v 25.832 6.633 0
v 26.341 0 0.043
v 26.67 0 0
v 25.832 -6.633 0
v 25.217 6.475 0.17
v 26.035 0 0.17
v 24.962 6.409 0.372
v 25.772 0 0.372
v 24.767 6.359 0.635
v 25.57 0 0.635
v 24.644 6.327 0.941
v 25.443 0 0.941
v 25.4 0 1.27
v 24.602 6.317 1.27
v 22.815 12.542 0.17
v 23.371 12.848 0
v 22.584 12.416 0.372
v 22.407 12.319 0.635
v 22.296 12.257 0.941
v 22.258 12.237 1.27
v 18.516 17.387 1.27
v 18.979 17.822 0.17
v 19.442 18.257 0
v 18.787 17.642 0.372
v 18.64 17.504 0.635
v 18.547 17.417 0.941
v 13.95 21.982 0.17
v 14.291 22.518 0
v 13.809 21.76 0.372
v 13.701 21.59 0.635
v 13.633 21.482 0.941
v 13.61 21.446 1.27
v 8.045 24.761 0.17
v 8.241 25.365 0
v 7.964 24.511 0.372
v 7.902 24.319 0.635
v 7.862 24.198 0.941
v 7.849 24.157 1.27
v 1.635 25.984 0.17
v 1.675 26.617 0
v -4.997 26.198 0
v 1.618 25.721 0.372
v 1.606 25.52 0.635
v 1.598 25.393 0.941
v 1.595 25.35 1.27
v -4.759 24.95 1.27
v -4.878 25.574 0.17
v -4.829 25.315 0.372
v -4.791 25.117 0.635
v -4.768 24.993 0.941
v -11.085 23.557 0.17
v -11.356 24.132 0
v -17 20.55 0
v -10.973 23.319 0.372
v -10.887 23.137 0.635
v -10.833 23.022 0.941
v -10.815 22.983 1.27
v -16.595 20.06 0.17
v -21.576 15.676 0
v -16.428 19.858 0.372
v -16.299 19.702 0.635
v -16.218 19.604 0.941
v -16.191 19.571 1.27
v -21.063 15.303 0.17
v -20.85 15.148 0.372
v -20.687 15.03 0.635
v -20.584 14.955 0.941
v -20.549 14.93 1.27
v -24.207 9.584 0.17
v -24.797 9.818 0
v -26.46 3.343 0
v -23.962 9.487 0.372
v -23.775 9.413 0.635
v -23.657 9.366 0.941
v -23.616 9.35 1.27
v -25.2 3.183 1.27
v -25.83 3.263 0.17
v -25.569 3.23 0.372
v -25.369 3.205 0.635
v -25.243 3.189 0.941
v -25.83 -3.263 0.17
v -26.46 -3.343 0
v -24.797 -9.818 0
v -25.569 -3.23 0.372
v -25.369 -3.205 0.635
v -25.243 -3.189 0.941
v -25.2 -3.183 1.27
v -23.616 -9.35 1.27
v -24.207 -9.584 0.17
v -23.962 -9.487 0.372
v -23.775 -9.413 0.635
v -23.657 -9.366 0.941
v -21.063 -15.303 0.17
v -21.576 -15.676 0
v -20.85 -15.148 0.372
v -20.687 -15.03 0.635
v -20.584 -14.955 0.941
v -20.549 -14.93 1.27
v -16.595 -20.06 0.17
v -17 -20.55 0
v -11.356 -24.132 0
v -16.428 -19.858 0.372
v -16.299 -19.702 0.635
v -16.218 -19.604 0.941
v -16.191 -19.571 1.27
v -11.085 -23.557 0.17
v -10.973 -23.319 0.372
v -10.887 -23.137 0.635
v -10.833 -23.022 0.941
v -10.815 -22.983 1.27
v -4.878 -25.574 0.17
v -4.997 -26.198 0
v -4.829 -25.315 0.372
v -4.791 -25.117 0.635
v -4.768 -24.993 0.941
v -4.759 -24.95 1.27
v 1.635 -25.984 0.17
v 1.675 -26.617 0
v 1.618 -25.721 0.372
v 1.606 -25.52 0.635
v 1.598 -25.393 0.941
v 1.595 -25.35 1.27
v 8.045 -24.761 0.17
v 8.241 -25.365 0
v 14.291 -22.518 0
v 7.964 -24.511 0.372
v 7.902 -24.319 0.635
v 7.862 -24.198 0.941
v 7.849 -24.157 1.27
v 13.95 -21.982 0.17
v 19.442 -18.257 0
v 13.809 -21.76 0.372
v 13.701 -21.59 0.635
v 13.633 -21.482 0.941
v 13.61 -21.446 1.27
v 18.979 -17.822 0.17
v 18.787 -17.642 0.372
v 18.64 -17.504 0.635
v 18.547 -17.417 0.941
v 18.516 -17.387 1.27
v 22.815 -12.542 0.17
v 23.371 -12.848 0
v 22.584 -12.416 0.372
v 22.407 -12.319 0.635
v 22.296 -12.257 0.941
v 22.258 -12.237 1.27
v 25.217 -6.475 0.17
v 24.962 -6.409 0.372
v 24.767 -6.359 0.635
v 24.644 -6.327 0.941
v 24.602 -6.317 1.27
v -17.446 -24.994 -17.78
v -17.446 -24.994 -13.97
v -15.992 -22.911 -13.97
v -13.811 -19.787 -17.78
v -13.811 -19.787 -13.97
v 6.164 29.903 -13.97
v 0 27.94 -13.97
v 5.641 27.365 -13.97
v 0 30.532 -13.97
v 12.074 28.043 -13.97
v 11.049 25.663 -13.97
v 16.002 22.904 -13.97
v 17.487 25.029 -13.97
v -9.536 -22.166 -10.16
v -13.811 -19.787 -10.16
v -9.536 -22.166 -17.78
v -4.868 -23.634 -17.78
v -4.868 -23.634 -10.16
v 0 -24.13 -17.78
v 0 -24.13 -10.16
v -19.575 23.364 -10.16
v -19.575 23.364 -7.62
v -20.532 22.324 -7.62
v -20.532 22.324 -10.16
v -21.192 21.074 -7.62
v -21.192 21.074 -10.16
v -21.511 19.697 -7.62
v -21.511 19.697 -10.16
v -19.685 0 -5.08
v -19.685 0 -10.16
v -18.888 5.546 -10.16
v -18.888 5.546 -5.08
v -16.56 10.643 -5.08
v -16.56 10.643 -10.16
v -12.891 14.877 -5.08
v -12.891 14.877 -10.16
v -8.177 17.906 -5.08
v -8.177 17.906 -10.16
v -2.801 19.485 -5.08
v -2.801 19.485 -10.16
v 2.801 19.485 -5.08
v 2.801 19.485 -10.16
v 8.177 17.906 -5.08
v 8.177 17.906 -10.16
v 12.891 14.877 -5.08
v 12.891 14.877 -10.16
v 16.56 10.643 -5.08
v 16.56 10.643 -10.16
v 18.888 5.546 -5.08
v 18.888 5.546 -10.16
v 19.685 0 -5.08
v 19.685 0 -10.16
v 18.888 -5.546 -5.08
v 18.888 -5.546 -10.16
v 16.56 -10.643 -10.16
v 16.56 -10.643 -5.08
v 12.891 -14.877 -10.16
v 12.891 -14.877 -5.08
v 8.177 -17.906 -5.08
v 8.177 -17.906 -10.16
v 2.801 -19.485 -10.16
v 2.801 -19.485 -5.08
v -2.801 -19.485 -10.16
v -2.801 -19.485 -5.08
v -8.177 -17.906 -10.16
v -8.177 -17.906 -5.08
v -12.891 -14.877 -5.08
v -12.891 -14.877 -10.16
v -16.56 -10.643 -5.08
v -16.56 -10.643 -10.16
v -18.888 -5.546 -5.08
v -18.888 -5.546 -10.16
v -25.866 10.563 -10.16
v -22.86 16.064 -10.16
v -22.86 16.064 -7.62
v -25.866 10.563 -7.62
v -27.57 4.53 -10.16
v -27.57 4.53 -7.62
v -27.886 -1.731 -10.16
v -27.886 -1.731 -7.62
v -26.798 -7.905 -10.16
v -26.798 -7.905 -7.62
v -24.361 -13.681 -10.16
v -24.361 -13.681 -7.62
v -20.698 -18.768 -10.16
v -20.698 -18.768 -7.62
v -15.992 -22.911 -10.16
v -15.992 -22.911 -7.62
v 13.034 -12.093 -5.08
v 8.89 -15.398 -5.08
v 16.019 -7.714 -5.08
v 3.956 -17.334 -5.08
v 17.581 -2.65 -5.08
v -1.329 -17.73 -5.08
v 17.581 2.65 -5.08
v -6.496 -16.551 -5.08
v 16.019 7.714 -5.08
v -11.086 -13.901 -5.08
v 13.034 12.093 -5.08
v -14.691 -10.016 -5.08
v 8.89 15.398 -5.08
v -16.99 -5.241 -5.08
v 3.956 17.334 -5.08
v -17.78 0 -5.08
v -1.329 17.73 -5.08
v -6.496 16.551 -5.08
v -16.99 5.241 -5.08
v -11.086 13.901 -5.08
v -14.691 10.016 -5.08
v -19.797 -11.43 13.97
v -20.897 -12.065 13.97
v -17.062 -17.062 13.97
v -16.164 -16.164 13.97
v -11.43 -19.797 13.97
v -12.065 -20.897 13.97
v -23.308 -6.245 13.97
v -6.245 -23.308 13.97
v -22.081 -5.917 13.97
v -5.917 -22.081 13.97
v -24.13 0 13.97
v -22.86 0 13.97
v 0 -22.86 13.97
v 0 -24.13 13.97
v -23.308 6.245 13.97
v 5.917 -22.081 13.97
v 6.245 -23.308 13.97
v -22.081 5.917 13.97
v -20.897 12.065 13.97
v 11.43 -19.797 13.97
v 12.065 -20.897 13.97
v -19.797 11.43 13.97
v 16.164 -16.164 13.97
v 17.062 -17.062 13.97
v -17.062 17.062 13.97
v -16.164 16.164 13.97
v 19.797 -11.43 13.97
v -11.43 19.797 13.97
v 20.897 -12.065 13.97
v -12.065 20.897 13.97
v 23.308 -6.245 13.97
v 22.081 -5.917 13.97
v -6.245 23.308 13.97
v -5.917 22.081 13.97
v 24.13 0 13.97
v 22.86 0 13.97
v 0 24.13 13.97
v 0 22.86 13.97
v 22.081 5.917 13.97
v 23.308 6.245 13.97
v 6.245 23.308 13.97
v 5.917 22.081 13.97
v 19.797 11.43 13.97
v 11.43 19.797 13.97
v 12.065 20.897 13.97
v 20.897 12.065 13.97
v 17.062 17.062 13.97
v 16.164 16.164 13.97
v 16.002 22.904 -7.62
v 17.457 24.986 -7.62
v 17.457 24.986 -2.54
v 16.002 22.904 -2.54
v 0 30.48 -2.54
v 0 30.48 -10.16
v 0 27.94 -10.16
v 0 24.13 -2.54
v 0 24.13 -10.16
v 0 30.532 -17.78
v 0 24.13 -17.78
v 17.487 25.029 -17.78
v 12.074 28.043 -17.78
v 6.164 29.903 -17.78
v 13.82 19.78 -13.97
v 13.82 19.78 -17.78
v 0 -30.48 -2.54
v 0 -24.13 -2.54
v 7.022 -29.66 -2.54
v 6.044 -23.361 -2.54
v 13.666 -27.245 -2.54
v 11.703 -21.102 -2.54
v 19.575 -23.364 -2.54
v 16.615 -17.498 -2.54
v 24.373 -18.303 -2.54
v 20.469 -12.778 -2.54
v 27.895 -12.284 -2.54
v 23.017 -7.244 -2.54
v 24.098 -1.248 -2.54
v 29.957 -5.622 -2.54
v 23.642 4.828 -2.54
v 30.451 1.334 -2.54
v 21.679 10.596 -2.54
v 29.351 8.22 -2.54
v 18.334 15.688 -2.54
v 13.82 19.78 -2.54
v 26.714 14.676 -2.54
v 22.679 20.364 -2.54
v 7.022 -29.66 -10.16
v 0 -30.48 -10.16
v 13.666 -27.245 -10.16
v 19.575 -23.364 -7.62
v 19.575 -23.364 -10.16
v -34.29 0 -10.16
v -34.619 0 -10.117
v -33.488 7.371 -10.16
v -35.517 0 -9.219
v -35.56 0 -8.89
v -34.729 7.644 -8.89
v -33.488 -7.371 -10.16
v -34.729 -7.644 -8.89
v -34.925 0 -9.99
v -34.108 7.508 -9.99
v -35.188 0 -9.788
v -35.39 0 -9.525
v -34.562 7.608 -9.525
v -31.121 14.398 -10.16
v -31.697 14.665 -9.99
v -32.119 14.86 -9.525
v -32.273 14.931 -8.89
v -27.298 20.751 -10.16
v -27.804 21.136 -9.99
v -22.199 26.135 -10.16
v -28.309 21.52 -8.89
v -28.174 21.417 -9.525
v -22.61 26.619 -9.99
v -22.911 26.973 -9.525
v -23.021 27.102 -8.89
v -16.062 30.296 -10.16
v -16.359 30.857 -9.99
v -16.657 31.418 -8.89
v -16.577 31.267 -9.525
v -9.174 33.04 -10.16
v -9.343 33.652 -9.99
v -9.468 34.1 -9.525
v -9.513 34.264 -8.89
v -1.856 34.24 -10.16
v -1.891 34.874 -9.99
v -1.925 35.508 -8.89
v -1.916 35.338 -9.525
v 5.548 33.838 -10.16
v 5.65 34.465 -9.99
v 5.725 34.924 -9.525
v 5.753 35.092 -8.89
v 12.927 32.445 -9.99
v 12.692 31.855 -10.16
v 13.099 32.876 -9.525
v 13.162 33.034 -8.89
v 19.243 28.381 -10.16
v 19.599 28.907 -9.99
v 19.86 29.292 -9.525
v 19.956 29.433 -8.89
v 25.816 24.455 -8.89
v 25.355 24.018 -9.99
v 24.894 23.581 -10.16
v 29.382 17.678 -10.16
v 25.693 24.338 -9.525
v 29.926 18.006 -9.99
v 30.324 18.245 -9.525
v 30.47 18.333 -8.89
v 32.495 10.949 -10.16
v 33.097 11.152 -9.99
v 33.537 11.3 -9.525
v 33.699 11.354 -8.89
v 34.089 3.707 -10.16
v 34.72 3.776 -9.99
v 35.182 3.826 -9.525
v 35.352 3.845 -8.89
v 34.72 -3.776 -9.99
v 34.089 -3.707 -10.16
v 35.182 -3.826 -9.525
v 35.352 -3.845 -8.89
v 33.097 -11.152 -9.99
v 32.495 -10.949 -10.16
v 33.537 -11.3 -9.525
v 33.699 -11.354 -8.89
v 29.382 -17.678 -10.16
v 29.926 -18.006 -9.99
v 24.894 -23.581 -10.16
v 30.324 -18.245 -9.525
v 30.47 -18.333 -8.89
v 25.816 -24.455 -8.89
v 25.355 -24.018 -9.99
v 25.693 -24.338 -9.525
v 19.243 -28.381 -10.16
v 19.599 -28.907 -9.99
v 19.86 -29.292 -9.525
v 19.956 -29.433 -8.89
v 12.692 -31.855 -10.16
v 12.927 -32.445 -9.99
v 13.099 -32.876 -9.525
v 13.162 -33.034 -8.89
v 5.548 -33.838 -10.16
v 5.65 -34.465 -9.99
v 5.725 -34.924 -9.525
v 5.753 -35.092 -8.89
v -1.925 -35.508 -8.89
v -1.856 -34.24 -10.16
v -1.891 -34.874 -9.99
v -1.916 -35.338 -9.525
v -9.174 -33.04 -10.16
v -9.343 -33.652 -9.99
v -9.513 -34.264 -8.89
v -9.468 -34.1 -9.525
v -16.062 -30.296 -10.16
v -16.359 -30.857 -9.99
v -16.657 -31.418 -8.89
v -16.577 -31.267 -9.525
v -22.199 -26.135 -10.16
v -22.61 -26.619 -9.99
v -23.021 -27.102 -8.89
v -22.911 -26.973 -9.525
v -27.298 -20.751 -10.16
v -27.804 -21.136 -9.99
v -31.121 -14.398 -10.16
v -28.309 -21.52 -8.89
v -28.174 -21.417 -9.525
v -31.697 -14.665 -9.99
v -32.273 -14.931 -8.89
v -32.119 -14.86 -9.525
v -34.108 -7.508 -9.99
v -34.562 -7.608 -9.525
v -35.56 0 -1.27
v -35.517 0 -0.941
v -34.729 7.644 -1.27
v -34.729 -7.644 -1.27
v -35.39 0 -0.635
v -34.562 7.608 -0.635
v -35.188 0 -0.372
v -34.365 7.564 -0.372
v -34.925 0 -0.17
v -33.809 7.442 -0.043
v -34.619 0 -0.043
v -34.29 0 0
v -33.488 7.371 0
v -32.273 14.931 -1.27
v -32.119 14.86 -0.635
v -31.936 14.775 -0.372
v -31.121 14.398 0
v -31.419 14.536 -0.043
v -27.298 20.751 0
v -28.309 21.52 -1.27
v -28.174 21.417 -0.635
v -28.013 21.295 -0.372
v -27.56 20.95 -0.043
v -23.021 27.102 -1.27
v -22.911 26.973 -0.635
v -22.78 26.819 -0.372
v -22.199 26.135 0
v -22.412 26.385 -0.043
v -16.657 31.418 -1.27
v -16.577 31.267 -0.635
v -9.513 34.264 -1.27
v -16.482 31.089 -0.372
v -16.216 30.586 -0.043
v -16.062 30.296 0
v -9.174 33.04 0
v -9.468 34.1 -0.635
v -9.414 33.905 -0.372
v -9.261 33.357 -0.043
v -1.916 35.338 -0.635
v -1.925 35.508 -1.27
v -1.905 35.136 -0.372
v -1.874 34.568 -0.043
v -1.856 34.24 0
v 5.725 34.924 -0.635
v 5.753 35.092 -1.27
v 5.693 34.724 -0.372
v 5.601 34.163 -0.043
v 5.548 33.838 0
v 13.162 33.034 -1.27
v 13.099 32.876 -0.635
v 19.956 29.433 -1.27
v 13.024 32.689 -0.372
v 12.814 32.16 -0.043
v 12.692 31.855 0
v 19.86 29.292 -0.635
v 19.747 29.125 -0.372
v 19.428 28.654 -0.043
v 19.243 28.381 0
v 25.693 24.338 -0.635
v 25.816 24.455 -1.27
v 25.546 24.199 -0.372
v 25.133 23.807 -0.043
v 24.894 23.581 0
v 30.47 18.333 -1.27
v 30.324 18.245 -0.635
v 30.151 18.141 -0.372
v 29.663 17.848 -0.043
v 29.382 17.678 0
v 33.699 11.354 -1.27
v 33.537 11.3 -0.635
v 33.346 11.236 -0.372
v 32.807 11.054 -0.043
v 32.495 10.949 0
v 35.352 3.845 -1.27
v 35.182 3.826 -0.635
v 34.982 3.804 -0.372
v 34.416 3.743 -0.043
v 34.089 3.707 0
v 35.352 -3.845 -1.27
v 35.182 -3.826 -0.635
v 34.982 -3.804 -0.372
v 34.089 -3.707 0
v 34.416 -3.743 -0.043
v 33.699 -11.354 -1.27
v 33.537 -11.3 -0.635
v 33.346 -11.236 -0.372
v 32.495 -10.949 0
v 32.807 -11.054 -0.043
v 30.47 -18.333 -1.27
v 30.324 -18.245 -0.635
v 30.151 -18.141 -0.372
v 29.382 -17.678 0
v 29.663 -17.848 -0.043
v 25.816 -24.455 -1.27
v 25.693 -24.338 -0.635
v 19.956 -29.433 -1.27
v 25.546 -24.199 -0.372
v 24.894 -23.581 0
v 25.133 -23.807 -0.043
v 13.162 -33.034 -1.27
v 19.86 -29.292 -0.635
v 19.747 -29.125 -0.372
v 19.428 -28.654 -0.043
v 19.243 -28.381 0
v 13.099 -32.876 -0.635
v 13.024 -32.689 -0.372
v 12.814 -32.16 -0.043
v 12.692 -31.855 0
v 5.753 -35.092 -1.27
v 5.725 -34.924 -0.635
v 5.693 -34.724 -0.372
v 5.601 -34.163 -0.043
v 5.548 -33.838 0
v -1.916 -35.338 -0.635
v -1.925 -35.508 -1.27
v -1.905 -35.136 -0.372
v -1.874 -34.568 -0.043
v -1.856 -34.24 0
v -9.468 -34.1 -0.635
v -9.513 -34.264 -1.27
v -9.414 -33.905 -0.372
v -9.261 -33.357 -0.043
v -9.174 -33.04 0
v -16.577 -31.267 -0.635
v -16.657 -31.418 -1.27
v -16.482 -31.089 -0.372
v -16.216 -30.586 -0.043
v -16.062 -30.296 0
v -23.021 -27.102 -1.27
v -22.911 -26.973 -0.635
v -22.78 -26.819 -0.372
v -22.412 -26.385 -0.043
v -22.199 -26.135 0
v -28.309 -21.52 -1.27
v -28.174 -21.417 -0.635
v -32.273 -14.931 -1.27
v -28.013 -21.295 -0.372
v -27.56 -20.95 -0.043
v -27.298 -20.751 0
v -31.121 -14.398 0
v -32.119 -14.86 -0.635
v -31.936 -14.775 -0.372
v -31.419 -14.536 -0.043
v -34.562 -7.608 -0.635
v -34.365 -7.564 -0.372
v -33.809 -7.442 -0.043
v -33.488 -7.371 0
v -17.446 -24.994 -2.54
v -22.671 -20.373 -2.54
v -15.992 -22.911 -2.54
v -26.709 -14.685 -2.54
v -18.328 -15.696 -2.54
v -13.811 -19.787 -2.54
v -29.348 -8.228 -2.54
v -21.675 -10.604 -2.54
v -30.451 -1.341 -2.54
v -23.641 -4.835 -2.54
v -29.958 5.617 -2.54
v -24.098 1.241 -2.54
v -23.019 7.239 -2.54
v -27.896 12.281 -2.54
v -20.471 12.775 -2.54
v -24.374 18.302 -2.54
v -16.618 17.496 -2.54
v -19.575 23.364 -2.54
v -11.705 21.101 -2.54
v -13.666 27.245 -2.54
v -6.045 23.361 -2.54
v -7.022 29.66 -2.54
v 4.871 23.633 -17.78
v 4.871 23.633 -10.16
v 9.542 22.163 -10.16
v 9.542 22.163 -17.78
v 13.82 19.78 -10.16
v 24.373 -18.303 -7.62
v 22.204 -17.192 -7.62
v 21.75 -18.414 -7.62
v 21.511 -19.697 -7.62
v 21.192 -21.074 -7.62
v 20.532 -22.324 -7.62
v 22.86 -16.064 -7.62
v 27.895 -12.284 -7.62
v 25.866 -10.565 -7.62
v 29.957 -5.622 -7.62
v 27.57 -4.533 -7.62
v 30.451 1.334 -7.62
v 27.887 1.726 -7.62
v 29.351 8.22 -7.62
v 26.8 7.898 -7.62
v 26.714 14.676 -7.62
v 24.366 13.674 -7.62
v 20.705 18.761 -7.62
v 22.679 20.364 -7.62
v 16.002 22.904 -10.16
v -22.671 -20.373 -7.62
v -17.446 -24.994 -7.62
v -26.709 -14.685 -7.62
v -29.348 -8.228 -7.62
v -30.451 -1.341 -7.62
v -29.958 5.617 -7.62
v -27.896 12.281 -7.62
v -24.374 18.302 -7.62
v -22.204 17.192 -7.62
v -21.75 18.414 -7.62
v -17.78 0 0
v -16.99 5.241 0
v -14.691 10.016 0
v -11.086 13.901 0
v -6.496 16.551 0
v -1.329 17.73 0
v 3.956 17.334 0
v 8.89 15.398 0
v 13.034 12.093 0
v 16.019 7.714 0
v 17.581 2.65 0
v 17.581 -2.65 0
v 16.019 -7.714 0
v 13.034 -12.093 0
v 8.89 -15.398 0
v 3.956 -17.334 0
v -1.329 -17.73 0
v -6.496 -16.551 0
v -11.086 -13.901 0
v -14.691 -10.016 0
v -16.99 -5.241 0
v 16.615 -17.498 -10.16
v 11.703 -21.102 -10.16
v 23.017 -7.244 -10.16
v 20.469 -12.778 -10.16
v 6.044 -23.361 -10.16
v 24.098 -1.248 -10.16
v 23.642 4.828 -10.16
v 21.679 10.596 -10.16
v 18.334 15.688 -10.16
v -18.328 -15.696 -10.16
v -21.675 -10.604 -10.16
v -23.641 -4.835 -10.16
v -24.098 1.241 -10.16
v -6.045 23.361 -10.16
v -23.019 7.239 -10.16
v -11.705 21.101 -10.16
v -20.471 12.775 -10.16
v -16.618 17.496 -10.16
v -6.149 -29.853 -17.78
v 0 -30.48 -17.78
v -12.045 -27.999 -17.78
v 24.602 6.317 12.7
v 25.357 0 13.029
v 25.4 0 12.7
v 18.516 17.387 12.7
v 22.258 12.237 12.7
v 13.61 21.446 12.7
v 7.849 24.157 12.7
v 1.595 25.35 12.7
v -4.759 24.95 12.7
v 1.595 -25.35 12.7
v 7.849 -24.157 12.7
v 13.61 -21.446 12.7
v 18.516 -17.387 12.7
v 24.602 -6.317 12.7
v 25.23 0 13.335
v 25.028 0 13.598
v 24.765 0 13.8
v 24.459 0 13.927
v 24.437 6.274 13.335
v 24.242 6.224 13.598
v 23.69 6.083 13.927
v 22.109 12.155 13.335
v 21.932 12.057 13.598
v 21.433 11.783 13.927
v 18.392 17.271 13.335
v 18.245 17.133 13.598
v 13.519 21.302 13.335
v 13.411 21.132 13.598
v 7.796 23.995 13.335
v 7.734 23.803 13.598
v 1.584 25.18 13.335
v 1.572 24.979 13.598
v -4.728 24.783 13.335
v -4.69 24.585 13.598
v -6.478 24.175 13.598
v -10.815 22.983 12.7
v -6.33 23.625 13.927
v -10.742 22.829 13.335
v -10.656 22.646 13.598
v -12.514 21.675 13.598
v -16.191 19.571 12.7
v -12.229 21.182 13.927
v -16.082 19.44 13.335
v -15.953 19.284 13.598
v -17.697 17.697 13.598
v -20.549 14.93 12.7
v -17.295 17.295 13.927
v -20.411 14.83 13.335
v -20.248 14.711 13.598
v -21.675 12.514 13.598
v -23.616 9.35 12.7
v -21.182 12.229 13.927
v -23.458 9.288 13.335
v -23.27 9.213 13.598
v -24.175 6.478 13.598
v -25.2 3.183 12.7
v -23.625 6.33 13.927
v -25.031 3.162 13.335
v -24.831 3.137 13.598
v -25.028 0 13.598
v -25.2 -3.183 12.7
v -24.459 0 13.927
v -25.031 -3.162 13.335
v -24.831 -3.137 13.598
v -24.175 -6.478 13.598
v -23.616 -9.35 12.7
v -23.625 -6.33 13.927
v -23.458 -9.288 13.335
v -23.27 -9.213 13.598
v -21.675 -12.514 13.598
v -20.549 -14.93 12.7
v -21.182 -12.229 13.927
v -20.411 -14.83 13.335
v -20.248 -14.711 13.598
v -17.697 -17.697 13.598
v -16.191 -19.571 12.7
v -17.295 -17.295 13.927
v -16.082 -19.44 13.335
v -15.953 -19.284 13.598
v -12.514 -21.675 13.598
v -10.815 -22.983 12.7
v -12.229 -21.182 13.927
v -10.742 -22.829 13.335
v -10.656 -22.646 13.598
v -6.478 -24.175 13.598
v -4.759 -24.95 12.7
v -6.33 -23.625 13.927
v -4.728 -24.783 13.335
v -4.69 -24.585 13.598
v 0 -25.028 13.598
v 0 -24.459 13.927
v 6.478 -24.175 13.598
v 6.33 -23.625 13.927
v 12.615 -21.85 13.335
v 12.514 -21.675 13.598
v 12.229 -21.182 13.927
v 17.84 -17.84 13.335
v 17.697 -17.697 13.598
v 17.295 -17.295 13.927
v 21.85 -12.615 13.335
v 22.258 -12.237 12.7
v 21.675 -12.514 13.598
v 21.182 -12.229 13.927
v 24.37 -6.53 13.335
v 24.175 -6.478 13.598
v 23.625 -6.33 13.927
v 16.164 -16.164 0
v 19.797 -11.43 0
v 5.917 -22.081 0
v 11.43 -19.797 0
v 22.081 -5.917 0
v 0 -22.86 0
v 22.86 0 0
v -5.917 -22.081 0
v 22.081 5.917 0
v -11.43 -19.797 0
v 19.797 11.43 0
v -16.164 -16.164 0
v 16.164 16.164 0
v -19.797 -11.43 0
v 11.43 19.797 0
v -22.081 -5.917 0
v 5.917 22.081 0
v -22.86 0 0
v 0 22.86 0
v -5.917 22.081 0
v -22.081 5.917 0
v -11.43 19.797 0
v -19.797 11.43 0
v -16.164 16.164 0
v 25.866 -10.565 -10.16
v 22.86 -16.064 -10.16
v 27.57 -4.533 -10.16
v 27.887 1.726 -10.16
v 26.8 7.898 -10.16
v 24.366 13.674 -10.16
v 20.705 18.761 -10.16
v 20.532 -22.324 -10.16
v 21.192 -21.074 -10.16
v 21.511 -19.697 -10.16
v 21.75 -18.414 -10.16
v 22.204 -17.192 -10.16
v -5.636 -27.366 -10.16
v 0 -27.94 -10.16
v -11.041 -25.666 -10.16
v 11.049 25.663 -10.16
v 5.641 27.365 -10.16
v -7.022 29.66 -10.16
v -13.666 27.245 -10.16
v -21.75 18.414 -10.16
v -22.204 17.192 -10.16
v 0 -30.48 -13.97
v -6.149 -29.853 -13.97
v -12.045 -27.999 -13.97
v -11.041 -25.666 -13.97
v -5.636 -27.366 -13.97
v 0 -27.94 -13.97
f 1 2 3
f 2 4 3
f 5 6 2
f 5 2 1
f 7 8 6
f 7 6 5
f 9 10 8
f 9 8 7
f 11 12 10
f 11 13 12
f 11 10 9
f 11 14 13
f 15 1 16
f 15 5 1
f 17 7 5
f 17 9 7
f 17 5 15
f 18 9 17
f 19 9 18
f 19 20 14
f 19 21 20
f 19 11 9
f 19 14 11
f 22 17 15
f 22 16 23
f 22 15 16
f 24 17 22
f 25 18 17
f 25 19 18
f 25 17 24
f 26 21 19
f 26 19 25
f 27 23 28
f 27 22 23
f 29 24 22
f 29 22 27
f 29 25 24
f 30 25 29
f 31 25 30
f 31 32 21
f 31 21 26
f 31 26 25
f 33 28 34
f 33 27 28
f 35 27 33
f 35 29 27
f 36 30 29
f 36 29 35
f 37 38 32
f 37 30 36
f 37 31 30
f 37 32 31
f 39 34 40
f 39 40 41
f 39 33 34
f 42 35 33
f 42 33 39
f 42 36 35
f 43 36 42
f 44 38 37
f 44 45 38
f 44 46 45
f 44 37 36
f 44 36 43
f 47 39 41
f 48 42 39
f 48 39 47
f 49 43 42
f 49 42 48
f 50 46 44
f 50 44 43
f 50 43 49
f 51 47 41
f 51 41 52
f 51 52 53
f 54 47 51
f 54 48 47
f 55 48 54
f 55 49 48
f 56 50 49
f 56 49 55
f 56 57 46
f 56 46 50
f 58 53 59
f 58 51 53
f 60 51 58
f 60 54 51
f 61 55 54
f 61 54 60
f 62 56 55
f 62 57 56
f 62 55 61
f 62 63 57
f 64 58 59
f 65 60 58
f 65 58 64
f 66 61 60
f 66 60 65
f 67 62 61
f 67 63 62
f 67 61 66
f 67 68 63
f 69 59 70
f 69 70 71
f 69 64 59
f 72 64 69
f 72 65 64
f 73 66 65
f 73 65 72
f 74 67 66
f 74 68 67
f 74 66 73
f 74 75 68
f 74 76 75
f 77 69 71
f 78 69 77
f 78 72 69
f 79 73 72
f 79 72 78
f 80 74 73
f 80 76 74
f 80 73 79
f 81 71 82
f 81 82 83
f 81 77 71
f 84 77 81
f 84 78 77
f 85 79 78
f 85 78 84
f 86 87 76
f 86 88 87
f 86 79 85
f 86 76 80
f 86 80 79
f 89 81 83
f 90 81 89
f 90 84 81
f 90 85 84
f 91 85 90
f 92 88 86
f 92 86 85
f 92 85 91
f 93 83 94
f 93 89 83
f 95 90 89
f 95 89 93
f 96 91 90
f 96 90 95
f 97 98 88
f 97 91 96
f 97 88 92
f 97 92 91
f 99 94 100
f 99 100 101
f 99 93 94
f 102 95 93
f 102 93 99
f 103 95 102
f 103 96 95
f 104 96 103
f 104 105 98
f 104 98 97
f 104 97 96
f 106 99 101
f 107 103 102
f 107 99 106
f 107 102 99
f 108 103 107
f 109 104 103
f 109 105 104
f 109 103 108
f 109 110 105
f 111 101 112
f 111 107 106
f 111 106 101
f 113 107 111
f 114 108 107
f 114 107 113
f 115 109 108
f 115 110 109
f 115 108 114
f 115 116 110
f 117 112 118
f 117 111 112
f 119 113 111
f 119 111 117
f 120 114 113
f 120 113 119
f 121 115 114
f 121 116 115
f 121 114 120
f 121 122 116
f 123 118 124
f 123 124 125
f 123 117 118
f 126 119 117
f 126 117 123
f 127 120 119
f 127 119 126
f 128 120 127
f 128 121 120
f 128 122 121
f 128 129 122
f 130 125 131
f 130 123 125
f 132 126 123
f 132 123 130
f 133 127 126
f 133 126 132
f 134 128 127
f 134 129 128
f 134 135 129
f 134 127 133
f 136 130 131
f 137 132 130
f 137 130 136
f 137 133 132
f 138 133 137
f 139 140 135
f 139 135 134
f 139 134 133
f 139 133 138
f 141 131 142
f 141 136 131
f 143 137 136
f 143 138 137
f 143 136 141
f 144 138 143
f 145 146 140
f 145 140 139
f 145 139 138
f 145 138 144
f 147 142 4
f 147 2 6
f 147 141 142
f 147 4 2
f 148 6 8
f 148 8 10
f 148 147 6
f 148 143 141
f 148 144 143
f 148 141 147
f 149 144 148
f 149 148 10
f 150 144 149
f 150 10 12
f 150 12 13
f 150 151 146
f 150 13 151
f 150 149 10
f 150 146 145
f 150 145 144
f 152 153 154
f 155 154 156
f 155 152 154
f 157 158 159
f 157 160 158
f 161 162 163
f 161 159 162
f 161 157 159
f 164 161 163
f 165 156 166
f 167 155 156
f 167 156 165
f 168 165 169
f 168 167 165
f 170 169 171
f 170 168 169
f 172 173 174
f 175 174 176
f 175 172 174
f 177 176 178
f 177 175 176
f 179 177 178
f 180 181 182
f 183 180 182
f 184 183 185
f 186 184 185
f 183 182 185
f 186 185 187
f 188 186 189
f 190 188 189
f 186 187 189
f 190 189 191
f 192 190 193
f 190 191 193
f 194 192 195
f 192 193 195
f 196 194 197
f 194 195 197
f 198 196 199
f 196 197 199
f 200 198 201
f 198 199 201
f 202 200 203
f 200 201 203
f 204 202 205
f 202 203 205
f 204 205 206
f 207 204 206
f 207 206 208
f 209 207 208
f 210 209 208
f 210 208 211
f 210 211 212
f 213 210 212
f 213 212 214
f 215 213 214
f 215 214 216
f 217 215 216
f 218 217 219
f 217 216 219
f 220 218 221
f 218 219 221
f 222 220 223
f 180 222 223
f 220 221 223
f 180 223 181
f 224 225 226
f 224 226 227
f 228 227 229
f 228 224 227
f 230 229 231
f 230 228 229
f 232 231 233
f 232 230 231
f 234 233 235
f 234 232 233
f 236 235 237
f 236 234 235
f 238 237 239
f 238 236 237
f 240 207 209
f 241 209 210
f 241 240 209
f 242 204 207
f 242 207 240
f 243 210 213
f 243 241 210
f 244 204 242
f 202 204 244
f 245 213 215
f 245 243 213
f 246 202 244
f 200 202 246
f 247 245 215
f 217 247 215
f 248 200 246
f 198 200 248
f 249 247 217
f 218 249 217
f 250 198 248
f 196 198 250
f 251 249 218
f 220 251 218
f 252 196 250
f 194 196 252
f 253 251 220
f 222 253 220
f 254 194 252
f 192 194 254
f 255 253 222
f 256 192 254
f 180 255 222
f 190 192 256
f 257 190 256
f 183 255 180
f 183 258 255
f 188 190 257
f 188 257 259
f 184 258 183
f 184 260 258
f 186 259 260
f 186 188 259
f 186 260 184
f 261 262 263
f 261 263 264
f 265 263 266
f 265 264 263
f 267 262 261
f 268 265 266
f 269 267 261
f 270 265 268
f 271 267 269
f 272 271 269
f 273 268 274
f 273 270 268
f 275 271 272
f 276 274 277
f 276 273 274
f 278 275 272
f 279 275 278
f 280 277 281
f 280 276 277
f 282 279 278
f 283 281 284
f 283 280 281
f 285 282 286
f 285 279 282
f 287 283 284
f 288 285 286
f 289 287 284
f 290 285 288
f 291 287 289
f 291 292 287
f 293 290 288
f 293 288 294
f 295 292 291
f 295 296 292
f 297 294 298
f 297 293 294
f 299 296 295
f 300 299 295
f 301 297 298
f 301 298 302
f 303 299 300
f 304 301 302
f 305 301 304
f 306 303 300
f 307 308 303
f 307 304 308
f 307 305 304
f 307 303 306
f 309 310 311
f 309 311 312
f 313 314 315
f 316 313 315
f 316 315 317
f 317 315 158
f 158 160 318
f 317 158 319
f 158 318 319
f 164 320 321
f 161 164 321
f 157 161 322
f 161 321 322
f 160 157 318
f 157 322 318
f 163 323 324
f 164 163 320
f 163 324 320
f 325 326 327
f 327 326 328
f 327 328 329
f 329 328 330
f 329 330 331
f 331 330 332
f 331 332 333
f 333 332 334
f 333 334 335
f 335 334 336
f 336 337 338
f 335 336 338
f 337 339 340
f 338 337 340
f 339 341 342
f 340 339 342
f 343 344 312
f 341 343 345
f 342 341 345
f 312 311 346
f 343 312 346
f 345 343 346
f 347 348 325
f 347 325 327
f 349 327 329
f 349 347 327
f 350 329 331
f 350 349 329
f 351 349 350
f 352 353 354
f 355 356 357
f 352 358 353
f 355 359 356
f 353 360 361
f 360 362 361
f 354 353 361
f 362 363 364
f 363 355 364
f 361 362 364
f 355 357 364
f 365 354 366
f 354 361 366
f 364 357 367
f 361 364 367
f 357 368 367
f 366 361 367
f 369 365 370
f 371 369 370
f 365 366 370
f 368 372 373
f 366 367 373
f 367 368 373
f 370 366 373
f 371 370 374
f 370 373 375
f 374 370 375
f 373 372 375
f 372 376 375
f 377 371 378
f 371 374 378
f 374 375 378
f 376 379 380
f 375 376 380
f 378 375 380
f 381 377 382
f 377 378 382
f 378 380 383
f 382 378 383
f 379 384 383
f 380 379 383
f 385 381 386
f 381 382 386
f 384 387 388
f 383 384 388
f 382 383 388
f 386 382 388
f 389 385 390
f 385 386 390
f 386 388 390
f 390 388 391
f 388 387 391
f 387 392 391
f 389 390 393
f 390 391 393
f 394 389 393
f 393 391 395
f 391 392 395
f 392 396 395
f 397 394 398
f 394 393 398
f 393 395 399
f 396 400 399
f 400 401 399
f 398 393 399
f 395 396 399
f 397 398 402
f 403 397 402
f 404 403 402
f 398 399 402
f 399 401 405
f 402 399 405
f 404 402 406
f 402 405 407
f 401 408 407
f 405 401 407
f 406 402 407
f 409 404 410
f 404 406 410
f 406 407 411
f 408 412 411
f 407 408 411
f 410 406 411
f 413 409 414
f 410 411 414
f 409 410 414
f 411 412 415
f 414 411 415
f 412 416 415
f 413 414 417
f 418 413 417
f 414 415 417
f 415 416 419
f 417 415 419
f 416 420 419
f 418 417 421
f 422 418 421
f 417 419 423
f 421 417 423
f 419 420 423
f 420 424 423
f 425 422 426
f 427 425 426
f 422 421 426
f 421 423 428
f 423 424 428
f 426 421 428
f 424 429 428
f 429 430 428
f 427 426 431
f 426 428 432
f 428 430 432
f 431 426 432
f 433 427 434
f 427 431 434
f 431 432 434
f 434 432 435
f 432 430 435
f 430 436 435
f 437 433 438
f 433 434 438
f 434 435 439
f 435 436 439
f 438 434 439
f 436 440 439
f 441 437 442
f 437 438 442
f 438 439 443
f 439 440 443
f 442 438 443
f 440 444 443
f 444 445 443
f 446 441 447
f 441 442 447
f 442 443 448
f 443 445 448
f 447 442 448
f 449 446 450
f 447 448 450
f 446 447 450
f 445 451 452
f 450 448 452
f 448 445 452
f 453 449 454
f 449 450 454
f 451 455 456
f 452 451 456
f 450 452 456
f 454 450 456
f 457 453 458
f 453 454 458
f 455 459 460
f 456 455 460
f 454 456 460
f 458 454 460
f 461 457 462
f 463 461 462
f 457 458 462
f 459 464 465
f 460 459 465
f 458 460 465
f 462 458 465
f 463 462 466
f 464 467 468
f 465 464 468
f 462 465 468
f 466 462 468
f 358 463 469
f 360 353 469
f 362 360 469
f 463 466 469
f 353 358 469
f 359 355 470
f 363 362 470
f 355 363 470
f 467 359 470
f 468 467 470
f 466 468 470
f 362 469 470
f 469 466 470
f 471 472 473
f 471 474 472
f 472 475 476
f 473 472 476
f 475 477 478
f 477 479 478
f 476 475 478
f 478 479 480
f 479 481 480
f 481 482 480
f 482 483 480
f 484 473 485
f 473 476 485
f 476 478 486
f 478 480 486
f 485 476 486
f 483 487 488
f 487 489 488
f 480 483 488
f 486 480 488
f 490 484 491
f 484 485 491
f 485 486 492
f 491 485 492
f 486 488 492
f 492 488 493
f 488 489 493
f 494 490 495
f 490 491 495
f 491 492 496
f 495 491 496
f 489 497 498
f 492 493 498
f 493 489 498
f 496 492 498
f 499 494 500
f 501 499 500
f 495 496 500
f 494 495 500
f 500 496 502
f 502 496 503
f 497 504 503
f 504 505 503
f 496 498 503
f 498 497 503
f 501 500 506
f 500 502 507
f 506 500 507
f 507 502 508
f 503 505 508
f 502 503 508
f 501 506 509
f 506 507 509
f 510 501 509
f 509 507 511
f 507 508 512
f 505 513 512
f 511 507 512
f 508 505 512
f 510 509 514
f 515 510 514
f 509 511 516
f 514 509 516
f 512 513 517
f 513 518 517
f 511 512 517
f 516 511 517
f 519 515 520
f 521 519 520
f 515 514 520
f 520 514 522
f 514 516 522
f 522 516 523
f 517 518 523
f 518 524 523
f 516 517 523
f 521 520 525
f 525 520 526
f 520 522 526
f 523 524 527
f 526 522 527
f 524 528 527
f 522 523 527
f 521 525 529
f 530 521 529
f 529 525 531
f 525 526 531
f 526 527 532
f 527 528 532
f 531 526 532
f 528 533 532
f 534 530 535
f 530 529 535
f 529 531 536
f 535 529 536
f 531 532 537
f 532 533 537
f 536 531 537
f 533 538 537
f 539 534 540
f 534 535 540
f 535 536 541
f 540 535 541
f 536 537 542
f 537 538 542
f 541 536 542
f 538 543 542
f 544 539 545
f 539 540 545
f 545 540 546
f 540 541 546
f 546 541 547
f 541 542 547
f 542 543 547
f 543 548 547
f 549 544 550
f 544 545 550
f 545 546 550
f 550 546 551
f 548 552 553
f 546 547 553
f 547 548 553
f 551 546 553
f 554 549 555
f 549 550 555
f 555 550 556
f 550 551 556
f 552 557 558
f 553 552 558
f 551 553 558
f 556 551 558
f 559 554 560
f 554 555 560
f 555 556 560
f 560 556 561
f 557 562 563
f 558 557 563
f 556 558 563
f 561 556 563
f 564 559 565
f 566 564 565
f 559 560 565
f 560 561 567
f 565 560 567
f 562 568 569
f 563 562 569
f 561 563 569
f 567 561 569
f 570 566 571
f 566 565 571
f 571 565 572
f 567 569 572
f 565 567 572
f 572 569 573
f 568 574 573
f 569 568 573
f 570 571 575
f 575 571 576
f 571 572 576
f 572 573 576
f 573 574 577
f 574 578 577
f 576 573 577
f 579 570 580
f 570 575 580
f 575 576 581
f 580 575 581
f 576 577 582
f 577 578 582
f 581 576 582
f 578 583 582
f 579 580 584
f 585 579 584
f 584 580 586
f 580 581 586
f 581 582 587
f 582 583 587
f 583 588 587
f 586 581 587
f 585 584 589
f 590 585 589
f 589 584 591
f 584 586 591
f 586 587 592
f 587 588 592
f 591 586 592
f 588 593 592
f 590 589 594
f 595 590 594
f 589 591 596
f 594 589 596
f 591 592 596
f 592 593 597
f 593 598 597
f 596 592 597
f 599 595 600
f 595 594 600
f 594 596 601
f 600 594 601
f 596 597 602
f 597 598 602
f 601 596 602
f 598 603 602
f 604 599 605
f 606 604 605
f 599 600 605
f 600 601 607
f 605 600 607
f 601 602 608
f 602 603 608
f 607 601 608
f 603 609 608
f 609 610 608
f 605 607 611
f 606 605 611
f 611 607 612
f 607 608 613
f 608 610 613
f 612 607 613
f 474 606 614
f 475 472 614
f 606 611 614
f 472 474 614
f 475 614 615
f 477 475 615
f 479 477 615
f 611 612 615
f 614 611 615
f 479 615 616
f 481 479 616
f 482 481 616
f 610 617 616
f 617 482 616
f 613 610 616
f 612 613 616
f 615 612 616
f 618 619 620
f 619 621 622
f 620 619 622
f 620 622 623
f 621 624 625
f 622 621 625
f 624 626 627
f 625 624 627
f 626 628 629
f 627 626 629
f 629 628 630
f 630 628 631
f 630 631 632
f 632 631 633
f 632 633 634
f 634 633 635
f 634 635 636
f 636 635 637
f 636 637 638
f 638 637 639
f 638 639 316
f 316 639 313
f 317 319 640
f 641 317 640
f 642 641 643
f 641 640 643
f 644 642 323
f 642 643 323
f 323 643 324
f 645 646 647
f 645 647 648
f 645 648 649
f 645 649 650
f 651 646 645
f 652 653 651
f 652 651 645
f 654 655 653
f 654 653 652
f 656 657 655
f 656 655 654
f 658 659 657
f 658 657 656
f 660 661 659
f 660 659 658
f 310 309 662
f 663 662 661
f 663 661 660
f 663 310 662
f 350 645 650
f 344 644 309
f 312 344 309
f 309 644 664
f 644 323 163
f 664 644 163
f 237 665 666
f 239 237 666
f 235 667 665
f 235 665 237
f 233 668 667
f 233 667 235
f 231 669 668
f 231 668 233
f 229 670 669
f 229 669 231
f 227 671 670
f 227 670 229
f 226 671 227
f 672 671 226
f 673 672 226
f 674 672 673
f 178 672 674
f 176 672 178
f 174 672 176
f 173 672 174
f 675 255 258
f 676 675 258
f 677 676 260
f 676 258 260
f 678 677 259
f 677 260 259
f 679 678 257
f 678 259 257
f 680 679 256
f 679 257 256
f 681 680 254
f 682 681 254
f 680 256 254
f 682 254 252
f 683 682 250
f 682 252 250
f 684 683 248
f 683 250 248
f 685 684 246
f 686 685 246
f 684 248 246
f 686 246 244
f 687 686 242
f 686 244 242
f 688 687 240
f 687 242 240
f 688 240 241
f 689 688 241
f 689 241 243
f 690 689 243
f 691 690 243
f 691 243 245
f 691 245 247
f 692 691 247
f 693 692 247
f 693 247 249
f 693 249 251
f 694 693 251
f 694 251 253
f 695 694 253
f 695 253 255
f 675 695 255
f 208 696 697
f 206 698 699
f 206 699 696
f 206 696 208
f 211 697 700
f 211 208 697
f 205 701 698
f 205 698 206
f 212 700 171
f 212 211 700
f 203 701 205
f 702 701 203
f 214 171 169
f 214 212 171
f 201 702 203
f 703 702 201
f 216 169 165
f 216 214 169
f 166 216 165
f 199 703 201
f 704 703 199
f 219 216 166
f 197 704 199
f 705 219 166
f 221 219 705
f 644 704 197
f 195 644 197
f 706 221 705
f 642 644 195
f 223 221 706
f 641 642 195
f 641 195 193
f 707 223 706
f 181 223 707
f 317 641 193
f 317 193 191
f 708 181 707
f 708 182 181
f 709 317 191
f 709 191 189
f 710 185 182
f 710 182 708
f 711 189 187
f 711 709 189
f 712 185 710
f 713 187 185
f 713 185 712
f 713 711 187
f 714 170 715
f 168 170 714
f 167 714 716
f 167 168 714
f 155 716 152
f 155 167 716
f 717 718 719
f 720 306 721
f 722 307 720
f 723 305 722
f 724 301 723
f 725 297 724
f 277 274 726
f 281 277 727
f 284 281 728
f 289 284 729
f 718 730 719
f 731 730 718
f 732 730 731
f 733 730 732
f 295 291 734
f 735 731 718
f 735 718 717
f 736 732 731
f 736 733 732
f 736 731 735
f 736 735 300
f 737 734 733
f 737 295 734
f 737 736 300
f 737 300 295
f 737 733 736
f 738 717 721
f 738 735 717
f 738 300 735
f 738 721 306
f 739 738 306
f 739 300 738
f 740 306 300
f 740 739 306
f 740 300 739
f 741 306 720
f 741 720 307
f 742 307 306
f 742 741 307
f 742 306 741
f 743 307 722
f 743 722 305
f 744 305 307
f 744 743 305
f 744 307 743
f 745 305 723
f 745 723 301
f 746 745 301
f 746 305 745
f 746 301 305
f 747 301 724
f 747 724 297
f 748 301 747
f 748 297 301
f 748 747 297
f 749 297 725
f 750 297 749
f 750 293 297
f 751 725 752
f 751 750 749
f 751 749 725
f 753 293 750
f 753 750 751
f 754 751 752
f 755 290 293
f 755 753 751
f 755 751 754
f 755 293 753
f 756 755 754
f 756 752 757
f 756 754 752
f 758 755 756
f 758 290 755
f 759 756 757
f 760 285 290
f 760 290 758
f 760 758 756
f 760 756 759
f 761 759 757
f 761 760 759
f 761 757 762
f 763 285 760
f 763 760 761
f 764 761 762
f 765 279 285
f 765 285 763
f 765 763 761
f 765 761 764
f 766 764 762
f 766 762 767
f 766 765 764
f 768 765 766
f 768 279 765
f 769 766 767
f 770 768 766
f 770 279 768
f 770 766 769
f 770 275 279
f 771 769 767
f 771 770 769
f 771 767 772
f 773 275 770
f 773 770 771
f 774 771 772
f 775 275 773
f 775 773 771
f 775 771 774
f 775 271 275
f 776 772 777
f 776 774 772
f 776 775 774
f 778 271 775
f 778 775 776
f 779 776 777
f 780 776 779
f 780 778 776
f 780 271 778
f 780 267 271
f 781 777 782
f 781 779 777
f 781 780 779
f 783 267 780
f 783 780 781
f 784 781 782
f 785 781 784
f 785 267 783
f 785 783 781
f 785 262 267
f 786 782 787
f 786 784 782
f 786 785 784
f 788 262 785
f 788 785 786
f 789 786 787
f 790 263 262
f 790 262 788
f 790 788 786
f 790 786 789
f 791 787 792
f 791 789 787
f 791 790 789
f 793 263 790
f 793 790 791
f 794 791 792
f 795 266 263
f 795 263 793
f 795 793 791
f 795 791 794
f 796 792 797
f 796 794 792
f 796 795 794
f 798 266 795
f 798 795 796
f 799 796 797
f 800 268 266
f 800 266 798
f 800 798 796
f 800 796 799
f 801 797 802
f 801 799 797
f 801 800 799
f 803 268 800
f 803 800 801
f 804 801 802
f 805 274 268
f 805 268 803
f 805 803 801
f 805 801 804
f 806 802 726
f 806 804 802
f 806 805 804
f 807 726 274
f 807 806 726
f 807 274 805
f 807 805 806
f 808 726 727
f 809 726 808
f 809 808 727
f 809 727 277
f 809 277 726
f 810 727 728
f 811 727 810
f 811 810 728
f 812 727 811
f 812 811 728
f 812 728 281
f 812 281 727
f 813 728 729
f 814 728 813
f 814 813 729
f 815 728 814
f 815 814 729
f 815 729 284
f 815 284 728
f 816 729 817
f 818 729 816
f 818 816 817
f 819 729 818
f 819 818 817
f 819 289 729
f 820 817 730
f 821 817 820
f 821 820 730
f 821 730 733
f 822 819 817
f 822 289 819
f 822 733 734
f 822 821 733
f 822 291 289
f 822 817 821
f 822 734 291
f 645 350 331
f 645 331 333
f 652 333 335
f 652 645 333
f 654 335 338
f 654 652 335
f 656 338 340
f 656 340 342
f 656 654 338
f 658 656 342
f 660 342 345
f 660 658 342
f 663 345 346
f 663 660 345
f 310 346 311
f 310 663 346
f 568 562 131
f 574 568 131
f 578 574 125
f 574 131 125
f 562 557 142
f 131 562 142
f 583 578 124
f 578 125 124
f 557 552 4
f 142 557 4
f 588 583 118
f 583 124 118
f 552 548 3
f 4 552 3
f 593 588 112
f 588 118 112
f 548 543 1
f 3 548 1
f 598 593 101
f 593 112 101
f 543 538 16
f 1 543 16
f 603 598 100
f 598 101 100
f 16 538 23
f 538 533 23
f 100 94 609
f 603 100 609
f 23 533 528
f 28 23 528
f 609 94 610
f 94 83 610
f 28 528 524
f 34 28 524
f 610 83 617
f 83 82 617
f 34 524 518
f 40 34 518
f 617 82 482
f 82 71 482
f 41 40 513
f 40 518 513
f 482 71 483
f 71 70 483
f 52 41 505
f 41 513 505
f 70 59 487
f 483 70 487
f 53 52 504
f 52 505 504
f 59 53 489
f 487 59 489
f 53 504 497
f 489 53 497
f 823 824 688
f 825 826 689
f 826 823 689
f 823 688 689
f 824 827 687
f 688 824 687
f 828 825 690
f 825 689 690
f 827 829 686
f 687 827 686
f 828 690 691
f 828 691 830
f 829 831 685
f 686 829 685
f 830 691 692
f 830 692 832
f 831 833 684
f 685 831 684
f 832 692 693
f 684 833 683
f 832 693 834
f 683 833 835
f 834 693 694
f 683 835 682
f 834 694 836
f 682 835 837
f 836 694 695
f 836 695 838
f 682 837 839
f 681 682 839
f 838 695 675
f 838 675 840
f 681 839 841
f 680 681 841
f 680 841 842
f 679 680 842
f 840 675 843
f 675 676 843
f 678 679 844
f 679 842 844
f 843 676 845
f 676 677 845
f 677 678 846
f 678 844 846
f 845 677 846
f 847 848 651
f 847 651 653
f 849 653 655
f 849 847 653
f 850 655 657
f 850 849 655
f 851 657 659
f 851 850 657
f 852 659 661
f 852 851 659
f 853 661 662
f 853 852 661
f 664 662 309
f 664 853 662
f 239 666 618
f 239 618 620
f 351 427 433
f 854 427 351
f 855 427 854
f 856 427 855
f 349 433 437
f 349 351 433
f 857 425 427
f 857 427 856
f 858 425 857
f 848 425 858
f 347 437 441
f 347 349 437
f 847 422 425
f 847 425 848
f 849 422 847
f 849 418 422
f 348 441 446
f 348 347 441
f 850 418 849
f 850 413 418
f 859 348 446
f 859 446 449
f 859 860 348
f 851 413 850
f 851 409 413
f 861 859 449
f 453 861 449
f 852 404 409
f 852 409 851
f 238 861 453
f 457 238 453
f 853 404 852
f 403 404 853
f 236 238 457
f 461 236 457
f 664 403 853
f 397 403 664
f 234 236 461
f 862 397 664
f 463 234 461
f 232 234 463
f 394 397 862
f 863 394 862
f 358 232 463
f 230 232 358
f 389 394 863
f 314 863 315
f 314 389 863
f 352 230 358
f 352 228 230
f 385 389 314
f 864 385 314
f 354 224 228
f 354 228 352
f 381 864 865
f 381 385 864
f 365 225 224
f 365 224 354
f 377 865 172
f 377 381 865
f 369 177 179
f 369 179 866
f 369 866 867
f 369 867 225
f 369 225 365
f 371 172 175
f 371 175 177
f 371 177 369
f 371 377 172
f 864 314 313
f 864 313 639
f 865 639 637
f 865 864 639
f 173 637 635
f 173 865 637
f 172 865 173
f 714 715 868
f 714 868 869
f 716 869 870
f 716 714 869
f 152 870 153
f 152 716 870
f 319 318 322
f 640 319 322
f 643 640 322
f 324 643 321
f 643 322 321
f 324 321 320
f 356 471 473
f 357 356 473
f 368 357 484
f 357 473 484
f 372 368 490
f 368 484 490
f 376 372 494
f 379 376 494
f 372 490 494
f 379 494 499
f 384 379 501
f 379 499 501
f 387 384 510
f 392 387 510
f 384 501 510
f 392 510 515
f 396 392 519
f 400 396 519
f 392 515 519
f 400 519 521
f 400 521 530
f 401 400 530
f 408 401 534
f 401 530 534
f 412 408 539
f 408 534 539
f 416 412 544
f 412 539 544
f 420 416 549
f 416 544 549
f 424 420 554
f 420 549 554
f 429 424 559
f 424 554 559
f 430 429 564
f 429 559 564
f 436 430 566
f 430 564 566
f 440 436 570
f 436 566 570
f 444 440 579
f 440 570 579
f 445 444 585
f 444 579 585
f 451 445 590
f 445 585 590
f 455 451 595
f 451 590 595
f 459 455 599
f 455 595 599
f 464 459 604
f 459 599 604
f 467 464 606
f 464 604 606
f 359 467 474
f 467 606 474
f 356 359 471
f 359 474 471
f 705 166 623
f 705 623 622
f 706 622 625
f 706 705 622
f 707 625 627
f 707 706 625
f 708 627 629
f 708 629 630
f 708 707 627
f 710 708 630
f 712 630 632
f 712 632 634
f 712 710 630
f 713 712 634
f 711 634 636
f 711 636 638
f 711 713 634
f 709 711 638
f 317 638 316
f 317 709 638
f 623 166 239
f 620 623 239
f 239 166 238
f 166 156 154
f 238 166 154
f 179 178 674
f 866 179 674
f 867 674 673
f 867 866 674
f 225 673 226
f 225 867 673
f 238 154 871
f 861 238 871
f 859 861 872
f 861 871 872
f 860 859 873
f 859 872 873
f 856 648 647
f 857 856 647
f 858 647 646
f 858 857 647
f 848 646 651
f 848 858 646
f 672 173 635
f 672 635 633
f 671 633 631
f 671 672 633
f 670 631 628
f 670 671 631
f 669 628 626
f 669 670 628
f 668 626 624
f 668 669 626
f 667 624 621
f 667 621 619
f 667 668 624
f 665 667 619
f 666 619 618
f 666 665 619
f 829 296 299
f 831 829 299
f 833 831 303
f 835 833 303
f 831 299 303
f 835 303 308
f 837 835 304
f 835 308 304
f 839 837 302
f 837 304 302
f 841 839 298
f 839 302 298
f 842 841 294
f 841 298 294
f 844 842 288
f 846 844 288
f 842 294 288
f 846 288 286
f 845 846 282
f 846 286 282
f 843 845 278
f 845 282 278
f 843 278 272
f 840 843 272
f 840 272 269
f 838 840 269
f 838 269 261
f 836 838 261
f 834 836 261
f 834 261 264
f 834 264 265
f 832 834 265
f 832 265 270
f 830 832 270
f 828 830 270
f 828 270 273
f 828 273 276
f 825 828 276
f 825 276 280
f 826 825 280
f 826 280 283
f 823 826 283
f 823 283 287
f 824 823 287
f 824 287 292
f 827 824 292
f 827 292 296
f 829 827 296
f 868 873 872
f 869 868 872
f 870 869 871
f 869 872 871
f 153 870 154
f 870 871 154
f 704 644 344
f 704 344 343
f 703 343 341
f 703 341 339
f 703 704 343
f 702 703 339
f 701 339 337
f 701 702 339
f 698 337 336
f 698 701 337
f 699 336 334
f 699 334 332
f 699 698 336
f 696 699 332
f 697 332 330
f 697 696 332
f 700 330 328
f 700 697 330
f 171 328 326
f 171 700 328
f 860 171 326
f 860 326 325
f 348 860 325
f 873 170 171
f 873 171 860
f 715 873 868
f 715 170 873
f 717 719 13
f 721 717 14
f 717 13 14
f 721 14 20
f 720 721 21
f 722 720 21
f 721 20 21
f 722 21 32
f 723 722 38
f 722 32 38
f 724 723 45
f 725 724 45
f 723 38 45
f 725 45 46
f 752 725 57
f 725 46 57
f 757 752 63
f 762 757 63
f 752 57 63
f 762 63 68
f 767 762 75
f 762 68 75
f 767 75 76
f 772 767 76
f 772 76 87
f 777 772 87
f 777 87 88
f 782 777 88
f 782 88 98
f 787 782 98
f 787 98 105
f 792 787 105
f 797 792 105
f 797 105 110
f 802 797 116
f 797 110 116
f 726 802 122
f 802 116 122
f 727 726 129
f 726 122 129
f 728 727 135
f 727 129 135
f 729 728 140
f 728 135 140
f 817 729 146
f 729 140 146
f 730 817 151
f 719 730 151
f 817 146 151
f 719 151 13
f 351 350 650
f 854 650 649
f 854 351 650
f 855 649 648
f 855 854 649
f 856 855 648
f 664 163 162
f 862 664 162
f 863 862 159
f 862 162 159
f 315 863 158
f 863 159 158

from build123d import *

# Parameters (mm, degrees)
SKETCH1_R           = 25.4
BOSS_EXTRUDE1_DEPTH = 13.97
SKETCH2_R           = 22.86
CUT_EXTRUDE1_DEPTH  = 25.4
SKETCH3_R           = 35.56
BOSS_EXTRUDE2_DEPTH = 10.16
SKETCH4_R           = 17.78
CUT_EXTRUDE2_DEPTH  = 10.16
CUT_EXTRUDE3_DEPTH  = 7.62
CUT_EXTRUDE4_DEPTH  = 5.08
BOSS_EXTRUDE3_START = 3.81
BOSS_EXTRUDE3_DEPTH = 3.81
BOSS_EXTRUDE4_START = 3.81
BOSS_EXTRUDE4_DEPTH = 3.81
FILLET1_R           = 1.27
FILLET2_R           = 1.27
BOSS_EXTRUDE5_START = 3.81
BOSS_EXTRUDE5_DEPTH = 3.81
BOSS_EXTRUDE6_START = 3.81
BOSS_EXTRUDE6_DEPTH = 3.81
SKETCH12_R          = 19.685
SKETCH12_R_2        = 15.494
CUT_EXTRUDE5_DEPTH  = 5.08
CUT_EXTRUDE6_DEPTH  = 7.62
CUT_EXTRUDE7_DEPTH  = 5.08


with BuildPart() as part:
    # Sketch1 → Boss-Extrude1 (new body)
    with BuildSketch(Plane.XY):
        Circle(SKETCH1_R)
    extrude(amount=BOSS_EXTRUDE1_DEPTH)

    # Sketch2 → Cut-Extrude1 (cut)
    with BuildSketch(Plane.XY.offset(13.97)):
        Circle(SKETCH2_R)
    extrude(amount=-CUT_EXTRUDE1_DEPTH, mode=Mode.SUBTRACT)

    # Sketch3 → Boss-Extrude2 (add)
    with BuildSketch(Plane(origin=(0, 0, 0), x_dir=(-1, 0, 0), z_dir=(0, 0, -1))):
        Circle(SKETCH3_R)
    extrude(amount=BOSS_EXTRUDE2_DEPTH)

    # Sketch4 → Cut-Extrude2 (cut)
    with BuildSketch(Plane(origin=(0, 0, -10.16), x_dir=(-1, 0, 0), z_dir=(0, 0, -1))):
        Circle(SKETCH4_R)
    extrude(amount=-CUT_EXTRUDE2_DEPTH, mode=Mode.SUBTRACT)

    # Sketch5 → Cut-Extrude3 (cut)
    with BuildSketch(Plane(origin=(0, 0, -10.16), x_dir=(-1, 0, 0), z_dir=(0, 0, -1))):
        with BuildLine():
            Line((0, 24.13), (0, 30.48))
            ThreePointArc((0, 30.48), (10.414, 28.645750191), (19.574595964, 23.363766667))
            ThreePointArc((19.574595964, 23.363766667), (20.902767484, 21.720232391), (21.5114344, 19.696678812))
            ThreePointArc((21.5114344, 19.696678812), (21.950994255, 17.793379172), (22.86, 16.064370514))
            ThreePointArc((22.86, 16.064370514), (27.516036857, -4.848846843), (15.991836773, -22.9108))
            Line((15.991836773, -22.9108), (13.811131758, -19.7866))
            ThreePointArc((13.811131758, -19.7866), (23.01855293, 7.239), (0, 24.13))
        make_face()
    extrude(amount=-CUT_EXTRUDE3_DEPTH, mode=Mode.SUBTRACT)

    # Sketch7 → Cut-Extrude4 (cut)
    with BuildSketch(Plane(origin=(0, 0, -7.62), x_dir=(-1, 0, 0), z_dir=(0, 0, -1))):
        with BuildLine():
            Line((17.445640116, -24.9936), (15.991836773, -22.9108))
            ThreePointArc((15.991836773, -22.9108), (27.516036857, -4.848846843), (22.86, 16.064370514))
            ThreePointArc((22.86, 16.064370514), (21.950994255, 17.793379172), (21.5114344, 19.696678812))
            ThreePointArc((21.5114344, 19.696678812), (20.902767484, 21.720232391), (19.574595964, 23.363766667))
            ThreePointArc((19.574595964, 23.363766667), (30.450504061, -1.340597786), (17.445640116, -24.9936))
        make_face()
    extrude(amount=-CUT_EXTRUDE4_DEPTH, mode=Mode.SUBTRACT)

    # Sketch8 → Boss-Extrude3 (add)
    with BuildSketch(Plane(origin=(0, 0, -10.16), x_dir=(-1, 0, 0), z_dir=(0, 0, -1)).offset(BOSS_EXTRUDE3_START)):
        with BuildLine():
            Line((0, -27.94), (0, -24.13))
            ThreePointArc((0, -24.13), (7.239, -23.01855293), (13.811131758, -19.7866))
            Line((13.811131758, -19.7866), (15.991836773, -22.9108))
            ThreePointArc((15.991836773, -22.9108), (8.382, -26.653061288), (0, -27.94))
        make_face()
    extrude(amount=-BOSS_EXTRUDE3_DEPTH)

    # Sketch9 → Boss-Extrude4 (add)
    with BuildSketch(Plane(origin=(0, 0, -13.97), x_dir=(-1, 0, 0), z_dir=(0, 0, -1)).offset(BOSS_EXTRUDE4_START)):
        with BuildLine():
            Line((0, -24.13), (0, -30.48))
            ThreePointArc((0, -30.48), (9.144, -29.076066859), (17.445640116, -24.9936))
            Line((17.445640116, -24.9936), (13.811131758, -19.7866))
            ThreePointArc((13.811131758, -19.7866), (7.239, -23.01855293), (0, -24.13))
        make_face()
    extrude(amount=-BOSS_EXTRUDE4_DEPTH)

    # Fillet1
    fillet1_edges = [part.edges().sort_by_distance(p)[0] for p in [
        (35.56, 0, -10.16),
    ]]
    fillet(fillet1_edges, radius=FILLET1_R)

    # Fillet2
    fillet2_edges = [part.edges().sort_by_distance(p)[0] for p in [
        (-25.4, 0, 0),
        (35.56, 0, 0),
        (-25.4, 0, 13.97),
    ]]
    fillet(fillet2_edges, radius=FILLET2_R)

    # Sketch10 → Boss-Extrude5 (add)
    with BuildSketch(Plane(origin=(0, 0, -10.16), x_dir=(-1, 0, 0), z_dir=(0, 0, -1)).offset(BOSS_EXTRUDE5_START)):
        with BuildLine():
            Line((-13.819909091, 19.780470488), (-16.002, 22.90370267))
            ThreePointArc((-16.002, 22.90370267), (-8.387912356, 26.651201217), (0, 27.94))
            Line((0, 27.94), (0, 24.13))
            ThreePointArc((0, 24.13), (-7.244106126, 23.016946505), (-13.819909091, 19.780470488))
        make_face()
    extrude(amount=-BOSS_EXTRUDE5_DEPTH)

    # Sketch11 → Boss-Extrude6 (add)
    with BuildSketch(Plane(origin=(0, 0, -13.97), x_dir=(-1, 0, 0), z_dir=(0, 0, -1)).offset(BOSS_EXTRUDE6_START)):
        with BuildLine():
            Line((-13.819909091, 19.780470488), (-17.486542269, 25.028531737))
            ThreePointArc((-17.486542269, 25.028531737), (-9.166078238, 29.123694325), (0, 30.53205793))
            Line((0, 30.53205793), (0, 24.13))
            ThreePointArc((0, 24.13), (-7.244106126, 23.016946505), (-13.819909091, 19.780470488))
        make_face()
    extrude(amount=-BOSS_EXTRUDE6_DEPTH)

    # Sketch12 → Cut-Extrude5 (cut)
    with BuildSketch(Plane(origin=(0, 0, -10.16), x_dir=(-1, 0, 0), z_dir=(0, 0, -1))):
        Circle(SKETCH12_R)
        Circle(SKETCH12_R_2, mode=Mode.SUBTRACT)
    extrude(amount=-CUT_EXTRUDE5_DEPTH, mode=Mode.SUBTRACT)

    # Sketch13 → Cut-Extrude6 (cut)
    with BuildSketch(Plane(origin=(0, 0, -10.16), x_dir=(-1, 0, 0), z_dir=(0, 0, -1))):
        with BuildLine():
            Line((-16.002, 22.90370267), (-13.819909091, 19.780470488))
            ThreePointArc((-13.819909091, 19.780470488), (-23.016946505, -7.244106126), (0, -24.13))
            Line((0, -24.13), (0, -30.48))
            ThreePointArc((0, -30.48), (-10.414, -28.645750191), (-19.574595964, -23.363766667))
            ThreePointArc((-19.574595964, -23.363766667), (-20.902767484, -21.720232391), (-21.5114344, -19.696678812))
            ThreePointArc((-21.5114344, -19.696678812), (-21.950994255, -17.793379172), (-22.86, -16.064370514))
            ThreePointArc((-22.86, -16.064370514), (-27.51711182, 4.842742724), (-16.002, 22.90370267))
        make_face()
    extrude(amount=-CUT_EXTRUDE6_DEPTH, mode=Mode.SUBTRACT)

    # Sketch15 → Cut-Extrude7 (cut)
    with BuildSketch(Plane(origin=(0, 0, -7.62), x_dir=(-1, 0, 0), z_dir=(0, 0, -1))):
        with BuildLine():
            Line((-17.456727273, 24.985857458), (-16.002, 22.90370267))
            ThreePointArc((-16.002, 22.90370267), (-27.51711182, 4.842742724), (-22.86, -16.064370514))
            ThreePointArc((-22.86, -16.064370514), (-21.950994255, -17.793379172), (-21.5114344, -19.696678812))
            ThreePointArc((-21.5114344, -19.696678812), (-20.902767484, -21.720232391), (-19.574595964, -23.363766667))
            ThreePointArc((-19.574595964, -23.363766667), (-30.450800702, 1.333842788), (-17.456727273, 24.985857458))
        make_face()
    extrude(amount=-CUT_EXTRUDE7_DEPTH, mode=Mode.SUBTRACT)


solid = part.part
